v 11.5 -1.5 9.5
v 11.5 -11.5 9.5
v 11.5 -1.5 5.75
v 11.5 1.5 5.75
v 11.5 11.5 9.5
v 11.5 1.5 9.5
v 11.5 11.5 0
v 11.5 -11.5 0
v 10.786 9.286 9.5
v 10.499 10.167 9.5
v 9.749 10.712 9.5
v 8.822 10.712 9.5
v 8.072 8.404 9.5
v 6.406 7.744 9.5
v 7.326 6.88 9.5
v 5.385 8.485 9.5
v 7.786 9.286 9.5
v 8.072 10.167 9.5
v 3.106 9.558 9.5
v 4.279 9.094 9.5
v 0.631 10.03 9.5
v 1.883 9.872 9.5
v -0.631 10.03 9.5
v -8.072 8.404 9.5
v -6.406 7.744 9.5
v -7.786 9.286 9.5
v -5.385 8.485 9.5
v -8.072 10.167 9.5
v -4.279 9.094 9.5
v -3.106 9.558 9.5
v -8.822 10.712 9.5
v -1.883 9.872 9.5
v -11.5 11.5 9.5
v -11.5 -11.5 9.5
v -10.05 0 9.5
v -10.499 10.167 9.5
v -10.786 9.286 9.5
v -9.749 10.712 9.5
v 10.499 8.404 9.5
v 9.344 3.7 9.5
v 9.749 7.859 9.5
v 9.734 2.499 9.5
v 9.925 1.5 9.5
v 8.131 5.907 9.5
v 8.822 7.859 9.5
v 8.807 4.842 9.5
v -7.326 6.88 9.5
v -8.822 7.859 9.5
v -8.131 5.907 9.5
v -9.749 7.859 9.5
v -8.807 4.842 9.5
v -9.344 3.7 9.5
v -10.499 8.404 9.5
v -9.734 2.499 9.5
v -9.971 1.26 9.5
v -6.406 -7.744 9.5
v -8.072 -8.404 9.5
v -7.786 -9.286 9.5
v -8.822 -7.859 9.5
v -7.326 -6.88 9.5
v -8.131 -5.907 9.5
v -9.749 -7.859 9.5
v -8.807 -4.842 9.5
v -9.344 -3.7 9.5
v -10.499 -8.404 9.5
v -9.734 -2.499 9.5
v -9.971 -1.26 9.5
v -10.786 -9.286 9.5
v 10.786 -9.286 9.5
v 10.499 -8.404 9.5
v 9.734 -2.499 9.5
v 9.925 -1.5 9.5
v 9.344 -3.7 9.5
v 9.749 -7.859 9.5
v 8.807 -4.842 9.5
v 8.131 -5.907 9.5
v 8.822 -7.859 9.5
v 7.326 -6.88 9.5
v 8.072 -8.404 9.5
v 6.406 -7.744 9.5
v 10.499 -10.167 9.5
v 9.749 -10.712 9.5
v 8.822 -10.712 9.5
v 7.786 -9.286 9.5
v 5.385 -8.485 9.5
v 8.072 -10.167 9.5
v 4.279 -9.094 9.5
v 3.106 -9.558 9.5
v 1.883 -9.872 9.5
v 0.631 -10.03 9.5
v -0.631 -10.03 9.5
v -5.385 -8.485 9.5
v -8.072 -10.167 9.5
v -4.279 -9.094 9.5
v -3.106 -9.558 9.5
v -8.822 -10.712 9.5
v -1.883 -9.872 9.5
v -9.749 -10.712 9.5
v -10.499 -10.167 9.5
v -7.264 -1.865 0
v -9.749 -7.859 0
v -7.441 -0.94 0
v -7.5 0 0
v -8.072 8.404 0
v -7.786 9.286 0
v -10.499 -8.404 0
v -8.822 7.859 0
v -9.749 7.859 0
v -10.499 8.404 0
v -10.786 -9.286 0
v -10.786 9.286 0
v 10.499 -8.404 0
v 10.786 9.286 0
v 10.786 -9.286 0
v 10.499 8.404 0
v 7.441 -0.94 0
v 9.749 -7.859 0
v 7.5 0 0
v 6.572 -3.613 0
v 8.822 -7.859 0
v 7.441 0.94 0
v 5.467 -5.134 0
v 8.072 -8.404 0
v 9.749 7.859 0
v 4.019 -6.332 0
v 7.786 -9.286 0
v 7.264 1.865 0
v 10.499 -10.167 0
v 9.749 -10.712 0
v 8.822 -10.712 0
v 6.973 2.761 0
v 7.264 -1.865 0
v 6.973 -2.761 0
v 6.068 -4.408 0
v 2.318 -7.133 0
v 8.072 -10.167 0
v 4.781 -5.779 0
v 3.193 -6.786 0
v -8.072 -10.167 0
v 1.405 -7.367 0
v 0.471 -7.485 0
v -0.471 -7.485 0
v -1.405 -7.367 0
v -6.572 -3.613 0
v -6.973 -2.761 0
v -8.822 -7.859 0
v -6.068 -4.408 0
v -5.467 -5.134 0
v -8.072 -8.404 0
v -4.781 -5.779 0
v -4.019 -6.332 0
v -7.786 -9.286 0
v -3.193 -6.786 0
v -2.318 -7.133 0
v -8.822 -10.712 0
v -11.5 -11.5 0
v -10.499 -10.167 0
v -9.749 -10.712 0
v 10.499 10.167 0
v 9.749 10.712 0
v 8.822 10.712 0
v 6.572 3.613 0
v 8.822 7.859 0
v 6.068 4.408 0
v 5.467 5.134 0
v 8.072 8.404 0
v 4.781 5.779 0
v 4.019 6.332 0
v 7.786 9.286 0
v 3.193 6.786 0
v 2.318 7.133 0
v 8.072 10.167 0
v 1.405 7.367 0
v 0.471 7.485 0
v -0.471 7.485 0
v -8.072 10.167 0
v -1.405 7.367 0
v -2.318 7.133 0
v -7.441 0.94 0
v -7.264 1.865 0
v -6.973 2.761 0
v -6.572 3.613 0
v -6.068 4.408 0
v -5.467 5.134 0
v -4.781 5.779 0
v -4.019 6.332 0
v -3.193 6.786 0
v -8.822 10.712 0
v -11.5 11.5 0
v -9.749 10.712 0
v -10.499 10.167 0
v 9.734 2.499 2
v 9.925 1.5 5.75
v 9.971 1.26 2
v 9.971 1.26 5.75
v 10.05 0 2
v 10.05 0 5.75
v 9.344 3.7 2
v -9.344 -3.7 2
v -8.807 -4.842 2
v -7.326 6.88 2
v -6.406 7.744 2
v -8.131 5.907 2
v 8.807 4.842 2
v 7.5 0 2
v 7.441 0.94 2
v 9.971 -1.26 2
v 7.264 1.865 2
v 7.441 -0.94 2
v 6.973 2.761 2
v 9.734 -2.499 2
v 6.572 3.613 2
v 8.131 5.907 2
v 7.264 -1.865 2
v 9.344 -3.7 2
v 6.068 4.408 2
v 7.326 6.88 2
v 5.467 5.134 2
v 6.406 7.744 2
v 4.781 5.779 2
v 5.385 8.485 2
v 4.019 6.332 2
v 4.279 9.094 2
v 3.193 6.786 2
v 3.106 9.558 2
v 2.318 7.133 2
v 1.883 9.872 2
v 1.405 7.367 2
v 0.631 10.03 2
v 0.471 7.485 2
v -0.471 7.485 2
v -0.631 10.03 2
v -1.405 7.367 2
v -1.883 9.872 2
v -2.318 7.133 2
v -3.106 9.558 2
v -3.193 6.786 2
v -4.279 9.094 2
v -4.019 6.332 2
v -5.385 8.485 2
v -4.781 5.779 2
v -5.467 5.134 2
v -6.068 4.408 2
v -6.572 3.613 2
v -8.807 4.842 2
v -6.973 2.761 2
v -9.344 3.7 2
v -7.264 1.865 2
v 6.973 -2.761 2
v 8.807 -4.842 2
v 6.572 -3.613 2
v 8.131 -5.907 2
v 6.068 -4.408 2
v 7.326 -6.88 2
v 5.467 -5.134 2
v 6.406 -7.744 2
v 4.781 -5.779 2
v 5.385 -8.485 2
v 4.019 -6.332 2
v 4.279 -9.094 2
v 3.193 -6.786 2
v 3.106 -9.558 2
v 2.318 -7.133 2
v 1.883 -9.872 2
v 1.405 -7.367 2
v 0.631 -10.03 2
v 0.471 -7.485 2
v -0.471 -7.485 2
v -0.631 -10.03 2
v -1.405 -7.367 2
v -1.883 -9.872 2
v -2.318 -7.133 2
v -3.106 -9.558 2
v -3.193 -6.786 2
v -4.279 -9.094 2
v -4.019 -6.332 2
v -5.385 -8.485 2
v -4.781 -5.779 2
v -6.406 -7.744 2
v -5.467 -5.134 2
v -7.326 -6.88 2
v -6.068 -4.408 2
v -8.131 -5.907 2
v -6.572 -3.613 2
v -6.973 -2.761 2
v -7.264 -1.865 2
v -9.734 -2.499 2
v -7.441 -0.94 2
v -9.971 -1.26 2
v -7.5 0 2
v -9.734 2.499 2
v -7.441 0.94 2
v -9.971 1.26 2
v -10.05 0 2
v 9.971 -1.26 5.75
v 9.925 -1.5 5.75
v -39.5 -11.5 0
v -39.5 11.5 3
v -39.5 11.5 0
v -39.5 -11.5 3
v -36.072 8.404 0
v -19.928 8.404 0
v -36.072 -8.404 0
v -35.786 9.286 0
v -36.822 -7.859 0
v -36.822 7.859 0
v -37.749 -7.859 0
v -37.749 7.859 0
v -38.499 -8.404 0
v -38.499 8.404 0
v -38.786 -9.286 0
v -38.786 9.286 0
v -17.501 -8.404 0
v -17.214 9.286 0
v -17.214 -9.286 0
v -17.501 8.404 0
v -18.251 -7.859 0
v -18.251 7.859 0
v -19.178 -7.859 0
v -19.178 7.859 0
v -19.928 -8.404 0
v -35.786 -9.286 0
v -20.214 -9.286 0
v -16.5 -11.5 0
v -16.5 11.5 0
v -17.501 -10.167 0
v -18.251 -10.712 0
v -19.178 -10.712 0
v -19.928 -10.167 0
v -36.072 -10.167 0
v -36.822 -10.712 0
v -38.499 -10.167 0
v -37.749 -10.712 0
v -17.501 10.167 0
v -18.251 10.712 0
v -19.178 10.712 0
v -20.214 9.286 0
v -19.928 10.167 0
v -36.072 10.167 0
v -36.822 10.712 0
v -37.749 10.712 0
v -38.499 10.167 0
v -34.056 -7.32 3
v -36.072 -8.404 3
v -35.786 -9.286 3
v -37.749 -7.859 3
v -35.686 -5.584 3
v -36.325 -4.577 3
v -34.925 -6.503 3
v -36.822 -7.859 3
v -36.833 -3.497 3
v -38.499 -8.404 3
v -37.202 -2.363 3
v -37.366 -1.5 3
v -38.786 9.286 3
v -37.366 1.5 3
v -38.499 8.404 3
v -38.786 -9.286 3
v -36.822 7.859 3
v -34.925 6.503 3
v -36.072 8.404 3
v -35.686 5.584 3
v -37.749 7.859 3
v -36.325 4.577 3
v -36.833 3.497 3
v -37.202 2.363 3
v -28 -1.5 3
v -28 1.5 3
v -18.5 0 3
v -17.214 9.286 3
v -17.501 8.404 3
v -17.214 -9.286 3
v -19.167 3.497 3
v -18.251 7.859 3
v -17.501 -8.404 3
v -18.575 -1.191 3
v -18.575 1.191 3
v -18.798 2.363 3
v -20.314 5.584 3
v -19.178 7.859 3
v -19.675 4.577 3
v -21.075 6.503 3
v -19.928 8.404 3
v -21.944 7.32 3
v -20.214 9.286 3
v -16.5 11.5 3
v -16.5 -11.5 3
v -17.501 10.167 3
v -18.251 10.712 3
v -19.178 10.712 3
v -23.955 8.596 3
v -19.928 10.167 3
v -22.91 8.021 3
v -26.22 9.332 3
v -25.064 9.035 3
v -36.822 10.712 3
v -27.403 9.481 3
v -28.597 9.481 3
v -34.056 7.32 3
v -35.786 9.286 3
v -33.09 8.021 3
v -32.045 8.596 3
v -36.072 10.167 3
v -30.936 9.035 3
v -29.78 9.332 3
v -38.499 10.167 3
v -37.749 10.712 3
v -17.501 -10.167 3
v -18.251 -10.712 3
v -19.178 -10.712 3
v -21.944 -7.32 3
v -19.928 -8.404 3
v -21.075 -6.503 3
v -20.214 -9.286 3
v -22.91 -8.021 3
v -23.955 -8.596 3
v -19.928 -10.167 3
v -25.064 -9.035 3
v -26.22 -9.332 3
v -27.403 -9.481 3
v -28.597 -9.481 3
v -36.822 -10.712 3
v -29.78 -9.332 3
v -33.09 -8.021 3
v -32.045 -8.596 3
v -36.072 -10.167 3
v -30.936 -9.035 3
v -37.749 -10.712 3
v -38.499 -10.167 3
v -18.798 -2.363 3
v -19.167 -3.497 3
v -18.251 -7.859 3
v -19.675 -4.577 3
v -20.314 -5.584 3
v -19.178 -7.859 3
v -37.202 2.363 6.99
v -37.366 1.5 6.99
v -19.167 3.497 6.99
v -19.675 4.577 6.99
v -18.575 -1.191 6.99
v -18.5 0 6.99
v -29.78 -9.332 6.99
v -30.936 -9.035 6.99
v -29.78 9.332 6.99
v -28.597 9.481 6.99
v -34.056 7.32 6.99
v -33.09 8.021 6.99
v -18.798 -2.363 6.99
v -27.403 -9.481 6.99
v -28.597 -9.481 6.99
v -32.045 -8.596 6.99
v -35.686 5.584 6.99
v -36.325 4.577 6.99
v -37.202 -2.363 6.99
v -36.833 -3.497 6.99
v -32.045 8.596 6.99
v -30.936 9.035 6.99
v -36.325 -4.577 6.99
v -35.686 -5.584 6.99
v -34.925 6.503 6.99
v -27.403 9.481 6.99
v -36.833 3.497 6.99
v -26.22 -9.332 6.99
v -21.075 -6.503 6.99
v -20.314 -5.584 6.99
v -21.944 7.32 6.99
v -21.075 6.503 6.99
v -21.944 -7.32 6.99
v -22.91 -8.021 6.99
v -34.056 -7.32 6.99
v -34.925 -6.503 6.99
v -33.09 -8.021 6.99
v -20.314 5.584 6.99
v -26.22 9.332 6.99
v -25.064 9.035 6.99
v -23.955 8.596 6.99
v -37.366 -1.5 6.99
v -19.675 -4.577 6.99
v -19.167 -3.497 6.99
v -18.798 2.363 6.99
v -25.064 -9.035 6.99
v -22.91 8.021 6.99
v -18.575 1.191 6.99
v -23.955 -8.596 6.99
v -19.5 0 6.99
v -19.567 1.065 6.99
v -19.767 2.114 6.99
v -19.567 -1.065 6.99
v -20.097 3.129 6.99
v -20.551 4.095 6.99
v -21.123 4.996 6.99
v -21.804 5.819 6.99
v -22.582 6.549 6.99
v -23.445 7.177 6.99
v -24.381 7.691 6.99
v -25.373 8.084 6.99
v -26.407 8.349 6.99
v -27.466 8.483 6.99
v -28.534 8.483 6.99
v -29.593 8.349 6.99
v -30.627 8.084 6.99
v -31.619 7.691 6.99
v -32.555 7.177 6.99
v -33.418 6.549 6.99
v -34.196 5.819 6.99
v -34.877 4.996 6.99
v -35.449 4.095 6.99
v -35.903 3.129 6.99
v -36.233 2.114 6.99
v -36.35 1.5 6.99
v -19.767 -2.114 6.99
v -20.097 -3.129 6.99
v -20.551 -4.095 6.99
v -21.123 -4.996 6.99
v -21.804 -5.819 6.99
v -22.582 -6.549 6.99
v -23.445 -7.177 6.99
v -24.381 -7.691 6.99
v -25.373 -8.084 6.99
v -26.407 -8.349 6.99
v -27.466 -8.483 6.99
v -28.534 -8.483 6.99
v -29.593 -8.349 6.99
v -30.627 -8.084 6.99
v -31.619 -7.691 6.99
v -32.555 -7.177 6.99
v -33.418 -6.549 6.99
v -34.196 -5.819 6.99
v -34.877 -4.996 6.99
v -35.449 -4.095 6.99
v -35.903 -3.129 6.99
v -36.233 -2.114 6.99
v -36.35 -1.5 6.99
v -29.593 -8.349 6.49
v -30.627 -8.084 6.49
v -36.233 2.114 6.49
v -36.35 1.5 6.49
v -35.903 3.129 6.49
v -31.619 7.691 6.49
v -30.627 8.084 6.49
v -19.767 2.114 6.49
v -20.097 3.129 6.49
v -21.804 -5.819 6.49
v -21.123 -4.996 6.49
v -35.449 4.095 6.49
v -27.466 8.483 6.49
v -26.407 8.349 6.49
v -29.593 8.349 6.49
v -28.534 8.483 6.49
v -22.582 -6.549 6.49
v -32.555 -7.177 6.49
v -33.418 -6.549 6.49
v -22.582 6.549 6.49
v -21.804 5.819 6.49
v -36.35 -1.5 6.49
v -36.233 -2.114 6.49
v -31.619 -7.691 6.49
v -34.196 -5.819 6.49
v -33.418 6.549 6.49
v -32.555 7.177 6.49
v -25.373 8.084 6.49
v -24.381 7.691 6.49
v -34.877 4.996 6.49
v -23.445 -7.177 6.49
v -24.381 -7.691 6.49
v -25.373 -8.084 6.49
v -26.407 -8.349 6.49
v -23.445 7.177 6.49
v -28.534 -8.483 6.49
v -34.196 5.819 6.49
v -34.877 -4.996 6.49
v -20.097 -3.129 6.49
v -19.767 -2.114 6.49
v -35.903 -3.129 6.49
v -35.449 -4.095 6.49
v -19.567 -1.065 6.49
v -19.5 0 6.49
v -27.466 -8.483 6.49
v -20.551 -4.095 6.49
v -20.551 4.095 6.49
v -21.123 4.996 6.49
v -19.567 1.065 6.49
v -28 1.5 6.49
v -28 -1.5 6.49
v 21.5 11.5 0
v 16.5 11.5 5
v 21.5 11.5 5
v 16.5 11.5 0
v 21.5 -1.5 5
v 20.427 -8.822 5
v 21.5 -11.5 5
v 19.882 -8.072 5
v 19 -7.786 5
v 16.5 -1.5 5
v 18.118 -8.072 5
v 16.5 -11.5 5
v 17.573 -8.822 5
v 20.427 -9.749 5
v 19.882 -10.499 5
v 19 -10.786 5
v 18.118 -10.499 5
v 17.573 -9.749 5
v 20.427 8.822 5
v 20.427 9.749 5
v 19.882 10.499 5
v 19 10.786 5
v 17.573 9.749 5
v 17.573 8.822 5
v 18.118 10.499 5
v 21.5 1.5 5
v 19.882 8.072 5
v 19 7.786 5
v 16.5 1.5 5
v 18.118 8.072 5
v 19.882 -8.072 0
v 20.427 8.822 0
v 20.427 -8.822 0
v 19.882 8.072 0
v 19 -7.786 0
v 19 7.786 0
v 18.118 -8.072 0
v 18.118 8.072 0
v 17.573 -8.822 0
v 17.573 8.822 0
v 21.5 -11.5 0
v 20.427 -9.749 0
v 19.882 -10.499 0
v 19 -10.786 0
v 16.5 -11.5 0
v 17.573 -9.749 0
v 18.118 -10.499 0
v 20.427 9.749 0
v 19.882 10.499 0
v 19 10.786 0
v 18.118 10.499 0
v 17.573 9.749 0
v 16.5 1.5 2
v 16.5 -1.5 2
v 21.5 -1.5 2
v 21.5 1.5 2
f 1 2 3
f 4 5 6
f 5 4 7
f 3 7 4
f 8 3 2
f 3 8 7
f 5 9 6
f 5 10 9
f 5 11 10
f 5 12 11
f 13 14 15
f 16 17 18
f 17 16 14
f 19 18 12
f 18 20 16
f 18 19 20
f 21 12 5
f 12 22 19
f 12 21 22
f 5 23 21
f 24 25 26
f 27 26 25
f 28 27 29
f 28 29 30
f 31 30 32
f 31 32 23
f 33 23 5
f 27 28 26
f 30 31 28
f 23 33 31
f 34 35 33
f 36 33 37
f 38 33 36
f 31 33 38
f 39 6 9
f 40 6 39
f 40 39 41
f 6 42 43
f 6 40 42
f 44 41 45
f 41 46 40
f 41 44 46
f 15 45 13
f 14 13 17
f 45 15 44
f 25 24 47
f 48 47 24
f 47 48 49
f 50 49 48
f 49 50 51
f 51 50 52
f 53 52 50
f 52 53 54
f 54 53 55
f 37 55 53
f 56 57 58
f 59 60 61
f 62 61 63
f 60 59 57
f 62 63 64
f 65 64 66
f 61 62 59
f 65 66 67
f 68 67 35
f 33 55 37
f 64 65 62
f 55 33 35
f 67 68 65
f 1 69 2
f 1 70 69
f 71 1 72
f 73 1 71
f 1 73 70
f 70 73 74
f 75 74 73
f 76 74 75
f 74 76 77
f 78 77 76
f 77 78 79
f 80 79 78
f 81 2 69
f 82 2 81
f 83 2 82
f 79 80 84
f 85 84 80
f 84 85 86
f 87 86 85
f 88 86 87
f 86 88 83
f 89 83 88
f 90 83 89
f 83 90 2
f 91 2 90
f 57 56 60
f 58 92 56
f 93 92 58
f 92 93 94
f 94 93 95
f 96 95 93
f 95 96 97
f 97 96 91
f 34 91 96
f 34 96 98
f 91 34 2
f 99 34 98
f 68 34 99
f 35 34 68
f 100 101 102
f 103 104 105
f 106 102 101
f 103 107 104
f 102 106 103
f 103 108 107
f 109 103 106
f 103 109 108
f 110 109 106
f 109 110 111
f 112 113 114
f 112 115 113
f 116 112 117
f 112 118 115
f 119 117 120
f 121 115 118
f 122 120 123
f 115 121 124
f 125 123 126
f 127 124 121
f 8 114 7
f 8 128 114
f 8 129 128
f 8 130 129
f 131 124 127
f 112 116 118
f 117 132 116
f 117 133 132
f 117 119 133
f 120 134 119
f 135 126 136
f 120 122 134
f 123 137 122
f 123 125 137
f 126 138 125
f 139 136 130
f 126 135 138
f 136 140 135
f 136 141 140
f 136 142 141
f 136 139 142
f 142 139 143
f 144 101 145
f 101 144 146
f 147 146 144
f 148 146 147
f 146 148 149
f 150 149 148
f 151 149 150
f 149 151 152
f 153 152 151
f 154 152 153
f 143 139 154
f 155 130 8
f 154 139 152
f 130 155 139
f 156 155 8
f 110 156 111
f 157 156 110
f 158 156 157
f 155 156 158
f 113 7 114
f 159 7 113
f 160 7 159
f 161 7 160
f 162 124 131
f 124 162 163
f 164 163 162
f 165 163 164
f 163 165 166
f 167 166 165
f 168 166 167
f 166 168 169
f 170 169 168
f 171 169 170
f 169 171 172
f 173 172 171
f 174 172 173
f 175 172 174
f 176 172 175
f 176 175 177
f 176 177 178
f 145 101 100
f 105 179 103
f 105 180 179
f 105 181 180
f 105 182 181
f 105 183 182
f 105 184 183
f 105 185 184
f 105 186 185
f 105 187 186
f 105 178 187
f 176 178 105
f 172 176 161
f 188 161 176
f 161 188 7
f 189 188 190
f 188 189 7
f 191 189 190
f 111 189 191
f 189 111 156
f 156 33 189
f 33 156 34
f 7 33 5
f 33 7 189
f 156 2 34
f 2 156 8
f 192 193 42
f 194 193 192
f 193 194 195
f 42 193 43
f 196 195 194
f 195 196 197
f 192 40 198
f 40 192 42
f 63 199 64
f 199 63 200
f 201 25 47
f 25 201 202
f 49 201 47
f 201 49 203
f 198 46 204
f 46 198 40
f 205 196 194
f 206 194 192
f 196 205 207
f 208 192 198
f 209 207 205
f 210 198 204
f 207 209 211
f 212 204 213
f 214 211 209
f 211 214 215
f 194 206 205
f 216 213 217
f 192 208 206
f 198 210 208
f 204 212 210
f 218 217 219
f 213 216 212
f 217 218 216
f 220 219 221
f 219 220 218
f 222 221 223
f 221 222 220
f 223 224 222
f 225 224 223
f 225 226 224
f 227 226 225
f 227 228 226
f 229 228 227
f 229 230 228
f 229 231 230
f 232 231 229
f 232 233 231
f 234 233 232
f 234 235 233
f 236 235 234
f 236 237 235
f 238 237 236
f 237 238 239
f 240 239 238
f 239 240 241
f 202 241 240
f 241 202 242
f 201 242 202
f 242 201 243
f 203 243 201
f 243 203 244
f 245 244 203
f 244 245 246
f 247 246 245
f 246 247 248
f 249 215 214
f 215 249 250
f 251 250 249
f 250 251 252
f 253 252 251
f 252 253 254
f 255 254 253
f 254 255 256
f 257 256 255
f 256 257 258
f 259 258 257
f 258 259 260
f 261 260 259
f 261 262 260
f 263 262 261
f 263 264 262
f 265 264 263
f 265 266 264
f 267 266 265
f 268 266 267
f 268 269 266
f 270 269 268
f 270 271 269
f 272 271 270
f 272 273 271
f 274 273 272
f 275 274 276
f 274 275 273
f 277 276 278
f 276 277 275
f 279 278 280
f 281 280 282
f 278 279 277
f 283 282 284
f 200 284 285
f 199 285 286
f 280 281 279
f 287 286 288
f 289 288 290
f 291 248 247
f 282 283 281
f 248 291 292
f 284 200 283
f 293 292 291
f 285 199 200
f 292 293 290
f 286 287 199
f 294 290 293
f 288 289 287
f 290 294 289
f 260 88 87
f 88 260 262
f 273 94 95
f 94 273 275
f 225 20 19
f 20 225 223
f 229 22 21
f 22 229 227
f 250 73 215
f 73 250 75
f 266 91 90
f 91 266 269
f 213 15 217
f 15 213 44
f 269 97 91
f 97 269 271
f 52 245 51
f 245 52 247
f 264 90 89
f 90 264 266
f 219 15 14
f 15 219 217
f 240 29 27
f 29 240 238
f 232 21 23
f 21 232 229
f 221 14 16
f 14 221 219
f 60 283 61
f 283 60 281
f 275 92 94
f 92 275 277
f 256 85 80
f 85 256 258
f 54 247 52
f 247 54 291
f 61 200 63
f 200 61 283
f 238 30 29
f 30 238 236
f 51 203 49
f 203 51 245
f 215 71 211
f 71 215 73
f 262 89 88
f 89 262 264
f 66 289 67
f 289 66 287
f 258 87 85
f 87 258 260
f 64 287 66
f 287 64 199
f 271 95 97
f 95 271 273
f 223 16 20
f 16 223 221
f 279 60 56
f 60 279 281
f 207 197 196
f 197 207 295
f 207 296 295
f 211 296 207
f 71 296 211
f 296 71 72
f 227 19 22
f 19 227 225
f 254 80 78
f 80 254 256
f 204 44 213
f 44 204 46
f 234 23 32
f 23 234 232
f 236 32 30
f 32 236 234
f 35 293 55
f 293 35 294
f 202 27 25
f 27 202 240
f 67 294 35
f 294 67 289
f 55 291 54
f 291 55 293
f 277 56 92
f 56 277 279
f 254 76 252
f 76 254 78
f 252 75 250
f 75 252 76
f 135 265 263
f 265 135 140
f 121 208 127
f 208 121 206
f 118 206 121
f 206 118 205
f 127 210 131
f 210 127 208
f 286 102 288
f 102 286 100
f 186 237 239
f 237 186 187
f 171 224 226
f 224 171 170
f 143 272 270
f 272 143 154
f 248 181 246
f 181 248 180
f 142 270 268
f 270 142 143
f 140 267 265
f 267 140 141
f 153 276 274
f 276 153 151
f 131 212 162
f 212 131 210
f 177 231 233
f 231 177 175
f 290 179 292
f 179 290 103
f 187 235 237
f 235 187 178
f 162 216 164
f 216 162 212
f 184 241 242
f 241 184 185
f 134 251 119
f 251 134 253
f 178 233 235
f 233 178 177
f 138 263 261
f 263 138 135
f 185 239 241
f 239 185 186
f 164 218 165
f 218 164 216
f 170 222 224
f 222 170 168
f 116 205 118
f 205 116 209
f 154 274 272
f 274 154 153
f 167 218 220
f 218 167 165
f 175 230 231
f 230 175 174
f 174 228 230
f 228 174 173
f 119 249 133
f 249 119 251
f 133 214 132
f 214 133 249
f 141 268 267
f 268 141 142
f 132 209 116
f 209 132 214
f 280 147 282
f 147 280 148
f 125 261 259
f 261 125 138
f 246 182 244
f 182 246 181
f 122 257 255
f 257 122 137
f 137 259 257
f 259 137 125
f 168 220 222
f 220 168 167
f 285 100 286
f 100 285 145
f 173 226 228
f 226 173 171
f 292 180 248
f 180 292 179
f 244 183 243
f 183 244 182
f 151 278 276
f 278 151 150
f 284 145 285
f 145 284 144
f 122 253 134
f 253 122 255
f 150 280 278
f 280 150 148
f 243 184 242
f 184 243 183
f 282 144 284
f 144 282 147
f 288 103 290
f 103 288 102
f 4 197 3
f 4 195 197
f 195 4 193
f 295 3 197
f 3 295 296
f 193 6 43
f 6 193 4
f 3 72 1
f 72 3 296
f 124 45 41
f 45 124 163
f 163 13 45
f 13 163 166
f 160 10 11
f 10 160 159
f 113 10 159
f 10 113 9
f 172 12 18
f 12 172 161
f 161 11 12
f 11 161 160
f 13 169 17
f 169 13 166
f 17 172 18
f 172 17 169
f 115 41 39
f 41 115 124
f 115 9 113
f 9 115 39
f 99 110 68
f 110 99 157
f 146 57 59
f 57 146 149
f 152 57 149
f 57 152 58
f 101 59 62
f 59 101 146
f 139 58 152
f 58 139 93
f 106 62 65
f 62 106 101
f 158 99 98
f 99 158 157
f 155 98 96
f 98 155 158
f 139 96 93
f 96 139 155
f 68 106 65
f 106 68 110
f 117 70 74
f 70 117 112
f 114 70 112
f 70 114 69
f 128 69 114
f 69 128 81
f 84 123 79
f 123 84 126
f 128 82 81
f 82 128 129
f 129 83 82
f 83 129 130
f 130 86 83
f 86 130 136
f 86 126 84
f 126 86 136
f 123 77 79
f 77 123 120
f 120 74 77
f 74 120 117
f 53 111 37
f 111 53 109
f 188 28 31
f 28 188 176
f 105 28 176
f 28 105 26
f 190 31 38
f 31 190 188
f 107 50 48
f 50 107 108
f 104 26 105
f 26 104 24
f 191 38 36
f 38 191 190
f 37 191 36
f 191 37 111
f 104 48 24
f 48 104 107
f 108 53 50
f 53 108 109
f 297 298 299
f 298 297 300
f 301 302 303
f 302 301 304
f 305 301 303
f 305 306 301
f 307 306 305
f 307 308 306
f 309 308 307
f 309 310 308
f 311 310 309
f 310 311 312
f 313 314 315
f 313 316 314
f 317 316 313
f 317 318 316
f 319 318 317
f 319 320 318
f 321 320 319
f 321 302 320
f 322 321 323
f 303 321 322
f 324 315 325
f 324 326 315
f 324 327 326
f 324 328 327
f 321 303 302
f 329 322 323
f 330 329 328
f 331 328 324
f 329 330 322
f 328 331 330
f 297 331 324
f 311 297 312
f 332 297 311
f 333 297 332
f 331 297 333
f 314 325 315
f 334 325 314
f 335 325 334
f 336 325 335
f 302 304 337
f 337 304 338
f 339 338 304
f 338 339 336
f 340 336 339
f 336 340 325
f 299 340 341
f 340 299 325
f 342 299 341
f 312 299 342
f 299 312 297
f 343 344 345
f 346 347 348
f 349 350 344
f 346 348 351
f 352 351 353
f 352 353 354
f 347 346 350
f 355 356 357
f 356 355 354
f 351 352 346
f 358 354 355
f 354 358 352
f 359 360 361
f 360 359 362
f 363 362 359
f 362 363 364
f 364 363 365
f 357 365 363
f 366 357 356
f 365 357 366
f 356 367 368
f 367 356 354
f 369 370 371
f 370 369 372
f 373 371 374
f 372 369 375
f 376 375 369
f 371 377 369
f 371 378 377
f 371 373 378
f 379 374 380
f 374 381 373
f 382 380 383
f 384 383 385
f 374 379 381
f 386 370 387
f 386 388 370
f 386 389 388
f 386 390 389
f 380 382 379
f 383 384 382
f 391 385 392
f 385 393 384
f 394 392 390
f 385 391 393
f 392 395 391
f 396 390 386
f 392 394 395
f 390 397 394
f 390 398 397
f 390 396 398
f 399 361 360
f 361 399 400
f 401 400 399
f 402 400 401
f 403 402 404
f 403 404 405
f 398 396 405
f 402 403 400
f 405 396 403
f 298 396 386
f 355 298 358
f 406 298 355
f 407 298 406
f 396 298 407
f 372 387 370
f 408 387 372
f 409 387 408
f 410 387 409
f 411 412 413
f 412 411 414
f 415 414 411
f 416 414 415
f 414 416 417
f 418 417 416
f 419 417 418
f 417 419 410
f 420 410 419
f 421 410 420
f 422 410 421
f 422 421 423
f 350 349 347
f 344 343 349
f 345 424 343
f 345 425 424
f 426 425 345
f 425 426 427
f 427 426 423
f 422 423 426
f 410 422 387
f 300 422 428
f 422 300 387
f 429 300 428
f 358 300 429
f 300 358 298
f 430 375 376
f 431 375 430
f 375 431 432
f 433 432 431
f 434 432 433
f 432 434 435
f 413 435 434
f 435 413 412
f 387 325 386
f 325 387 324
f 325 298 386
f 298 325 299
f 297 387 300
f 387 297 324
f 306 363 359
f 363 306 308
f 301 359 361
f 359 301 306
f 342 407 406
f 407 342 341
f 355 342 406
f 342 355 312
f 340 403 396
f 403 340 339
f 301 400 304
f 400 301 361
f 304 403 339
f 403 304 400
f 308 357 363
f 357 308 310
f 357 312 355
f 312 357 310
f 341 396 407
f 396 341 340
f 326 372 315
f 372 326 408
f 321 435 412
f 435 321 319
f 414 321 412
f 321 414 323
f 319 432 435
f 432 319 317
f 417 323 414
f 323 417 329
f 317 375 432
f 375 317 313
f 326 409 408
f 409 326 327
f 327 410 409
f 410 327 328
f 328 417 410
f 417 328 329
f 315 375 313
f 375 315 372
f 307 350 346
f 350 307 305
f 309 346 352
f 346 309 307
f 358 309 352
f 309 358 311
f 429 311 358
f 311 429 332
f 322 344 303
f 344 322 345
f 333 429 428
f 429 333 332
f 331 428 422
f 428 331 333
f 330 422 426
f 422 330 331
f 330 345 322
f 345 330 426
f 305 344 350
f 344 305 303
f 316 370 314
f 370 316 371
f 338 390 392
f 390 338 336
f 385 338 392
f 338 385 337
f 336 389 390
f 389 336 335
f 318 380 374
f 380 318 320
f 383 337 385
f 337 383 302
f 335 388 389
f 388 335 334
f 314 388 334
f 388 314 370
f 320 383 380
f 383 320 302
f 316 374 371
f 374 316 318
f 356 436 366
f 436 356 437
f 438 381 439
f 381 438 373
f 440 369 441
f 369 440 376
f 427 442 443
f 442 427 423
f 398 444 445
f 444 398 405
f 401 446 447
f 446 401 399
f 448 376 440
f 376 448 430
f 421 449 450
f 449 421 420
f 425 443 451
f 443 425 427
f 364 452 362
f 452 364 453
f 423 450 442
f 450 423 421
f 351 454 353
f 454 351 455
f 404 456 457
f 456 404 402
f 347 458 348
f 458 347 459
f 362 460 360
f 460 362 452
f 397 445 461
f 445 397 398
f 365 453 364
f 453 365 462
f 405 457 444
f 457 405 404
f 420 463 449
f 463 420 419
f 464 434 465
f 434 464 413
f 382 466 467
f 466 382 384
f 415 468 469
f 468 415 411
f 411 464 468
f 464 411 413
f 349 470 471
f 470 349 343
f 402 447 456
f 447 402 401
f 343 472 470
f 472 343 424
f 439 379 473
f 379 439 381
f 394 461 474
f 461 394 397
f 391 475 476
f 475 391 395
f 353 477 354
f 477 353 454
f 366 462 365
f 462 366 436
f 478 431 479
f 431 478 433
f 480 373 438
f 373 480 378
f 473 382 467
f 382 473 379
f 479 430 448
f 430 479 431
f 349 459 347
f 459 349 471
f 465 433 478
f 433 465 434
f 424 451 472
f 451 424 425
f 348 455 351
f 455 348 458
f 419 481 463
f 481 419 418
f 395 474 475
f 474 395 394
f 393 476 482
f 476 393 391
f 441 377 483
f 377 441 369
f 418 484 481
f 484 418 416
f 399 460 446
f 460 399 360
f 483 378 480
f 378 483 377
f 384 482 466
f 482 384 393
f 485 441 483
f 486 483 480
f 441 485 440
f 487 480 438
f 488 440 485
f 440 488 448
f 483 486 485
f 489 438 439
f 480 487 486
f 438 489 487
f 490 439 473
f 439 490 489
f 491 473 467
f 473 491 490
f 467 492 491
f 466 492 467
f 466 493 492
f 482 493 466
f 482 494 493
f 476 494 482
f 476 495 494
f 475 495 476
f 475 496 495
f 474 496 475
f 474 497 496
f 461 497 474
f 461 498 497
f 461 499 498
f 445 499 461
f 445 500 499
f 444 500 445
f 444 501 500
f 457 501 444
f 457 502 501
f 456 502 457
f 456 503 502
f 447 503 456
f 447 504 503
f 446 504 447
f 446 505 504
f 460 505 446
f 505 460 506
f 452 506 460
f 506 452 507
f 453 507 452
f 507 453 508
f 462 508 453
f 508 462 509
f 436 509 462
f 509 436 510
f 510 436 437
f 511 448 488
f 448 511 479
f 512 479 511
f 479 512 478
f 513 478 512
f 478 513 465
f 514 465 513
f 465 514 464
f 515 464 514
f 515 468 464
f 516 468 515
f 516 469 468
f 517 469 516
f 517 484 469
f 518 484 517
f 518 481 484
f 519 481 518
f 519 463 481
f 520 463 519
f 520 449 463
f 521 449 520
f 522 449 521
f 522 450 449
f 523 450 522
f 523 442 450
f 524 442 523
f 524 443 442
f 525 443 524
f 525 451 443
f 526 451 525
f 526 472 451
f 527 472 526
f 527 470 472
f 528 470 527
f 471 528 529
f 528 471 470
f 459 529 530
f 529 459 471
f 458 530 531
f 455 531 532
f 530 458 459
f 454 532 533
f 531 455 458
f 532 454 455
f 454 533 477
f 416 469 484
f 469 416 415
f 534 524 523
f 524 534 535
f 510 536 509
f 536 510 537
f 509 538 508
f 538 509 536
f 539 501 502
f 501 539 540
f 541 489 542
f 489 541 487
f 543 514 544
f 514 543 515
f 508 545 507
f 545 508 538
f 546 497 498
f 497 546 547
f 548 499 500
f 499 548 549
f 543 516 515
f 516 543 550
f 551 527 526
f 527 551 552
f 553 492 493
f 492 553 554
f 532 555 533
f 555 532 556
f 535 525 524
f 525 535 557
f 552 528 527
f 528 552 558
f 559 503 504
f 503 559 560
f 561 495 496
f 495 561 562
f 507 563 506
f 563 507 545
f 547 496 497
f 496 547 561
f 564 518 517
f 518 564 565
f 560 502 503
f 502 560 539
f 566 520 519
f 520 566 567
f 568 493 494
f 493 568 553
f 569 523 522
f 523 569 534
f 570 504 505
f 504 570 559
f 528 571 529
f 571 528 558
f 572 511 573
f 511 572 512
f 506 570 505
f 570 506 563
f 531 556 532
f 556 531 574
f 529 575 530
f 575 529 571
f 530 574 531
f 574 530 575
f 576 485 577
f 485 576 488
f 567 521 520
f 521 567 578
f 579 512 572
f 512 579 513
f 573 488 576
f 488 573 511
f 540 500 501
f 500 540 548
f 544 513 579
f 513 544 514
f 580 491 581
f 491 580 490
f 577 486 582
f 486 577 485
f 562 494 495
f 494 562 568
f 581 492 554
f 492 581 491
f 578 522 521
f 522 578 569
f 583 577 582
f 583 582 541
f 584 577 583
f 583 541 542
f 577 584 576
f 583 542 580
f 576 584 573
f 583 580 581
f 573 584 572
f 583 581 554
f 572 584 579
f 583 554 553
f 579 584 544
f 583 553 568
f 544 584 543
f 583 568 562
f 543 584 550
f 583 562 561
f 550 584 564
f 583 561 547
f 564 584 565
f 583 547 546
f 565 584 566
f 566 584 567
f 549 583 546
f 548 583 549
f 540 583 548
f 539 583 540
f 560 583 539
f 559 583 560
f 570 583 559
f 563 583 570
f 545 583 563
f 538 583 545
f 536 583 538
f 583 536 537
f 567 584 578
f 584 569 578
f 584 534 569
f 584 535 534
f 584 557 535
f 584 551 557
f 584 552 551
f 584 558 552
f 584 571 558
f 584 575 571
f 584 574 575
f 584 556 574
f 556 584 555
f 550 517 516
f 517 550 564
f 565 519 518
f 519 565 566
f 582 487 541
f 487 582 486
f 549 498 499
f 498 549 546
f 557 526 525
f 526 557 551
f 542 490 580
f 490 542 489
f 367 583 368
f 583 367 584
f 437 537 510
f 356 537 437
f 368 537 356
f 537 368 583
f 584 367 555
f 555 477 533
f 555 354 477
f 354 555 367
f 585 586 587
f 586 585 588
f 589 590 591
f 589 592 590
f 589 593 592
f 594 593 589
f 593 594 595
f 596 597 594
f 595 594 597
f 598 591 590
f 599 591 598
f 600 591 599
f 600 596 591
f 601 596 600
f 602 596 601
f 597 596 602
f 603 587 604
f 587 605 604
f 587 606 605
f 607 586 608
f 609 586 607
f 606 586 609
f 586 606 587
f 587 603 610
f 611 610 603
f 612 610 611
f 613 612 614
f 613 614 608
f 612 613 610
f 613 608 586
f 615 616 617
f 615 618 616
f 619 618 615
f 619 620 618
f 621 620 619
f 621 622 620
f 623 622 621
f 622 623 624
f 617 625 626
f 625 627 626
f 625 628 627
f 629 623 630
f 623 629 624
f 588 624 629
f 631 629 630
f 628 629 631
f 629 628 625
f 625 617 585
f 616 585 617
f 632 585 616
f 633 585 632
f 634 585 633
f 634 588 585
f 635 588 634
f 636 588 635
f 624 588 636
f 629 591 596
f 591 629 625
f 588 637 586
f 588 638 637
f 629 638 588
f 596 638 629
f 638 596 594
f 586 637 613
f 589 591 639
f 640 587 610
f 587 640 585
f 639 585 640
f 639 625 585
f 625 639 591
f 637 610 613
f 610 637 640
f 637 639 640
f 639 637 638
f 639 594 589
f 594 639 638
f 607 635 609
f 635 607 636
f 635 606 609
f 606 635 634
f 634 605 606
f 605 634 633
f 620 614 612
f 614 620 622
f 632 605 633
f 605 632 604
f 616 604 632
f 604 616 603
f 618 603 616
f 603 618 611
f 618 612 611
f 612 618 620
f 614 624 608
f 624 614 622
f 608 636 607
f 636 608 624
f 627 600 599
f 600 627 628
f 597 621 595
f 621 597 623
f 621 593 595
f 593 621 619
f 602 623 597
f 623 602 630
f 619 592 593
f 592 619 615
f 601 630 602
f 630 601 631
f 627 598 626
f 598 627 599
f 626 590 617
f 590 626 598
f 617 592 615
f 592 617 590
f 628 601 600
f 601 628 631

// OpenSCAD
//
// This script is used to create the components for a printable inkjet head, and is based
// on the design by Adrian Bowyer (http://www.thingiverse.com/thing:5152). This script
// is parameterized so that different sized piezos and nozzle plates can be used.
//
// The main difference from the #5152 version is that only a single o-ring is used.
//
// License: GPL V2
// 
// Version 0.1, Dec 17th, 2010 - Created by madscifi - This has not yet been printed
// Modified by Adrian to allow for 2 or 1 O rings and to make the clamp plate thicker in the middle. 
// 

//
// If gen_for_stl is 0, the various components are positioned as an "exploded" stack,
// so it is easy to see how they interact. 
//
// If gen_for_stl is 1, the various components are positioned to be printed as a single
// plate, with the components distributed along the x axis.
//
// As originally submitted this script is configured to create all components for printing
// and is configured for a 20 mm diameter piezo and a 2 mm high o-ring.

gen_for_stl = 1;	   		// set to 1 if the enabled component should be positioned for printing

//
// The following variables control the various dimensions - all in mm
// These will likely need to be changed, depending on the specific piezo,
// o-ring and nozzle plate used.
//

piezo_diameter=20;		// diameter of piezo disk
piezo_height=0.5;		// height of piezo disk

o_ring_height=2;		// height of o-ring
number_of_o_rings=1;         // Set to 2 to sandwich the piezo between 2 O rings; 1 for just one underneath


nozzle_plate_height=2;

body_xy_extra=3; 		// extra space beyond the piezo that the body uses.
body_extra_height=3;

bolt_hole_diameter=3;	// diameter of bolt holes

tube_diameter = 3;		// diameter of tubing
tube_clamp_extra_height = 2;	// extra height ( over tube height) of tube clamp.
tube_clamp_extra_width = 2; // extra width (over bolt holes) of tube clamp

//
// The following variables might need to be tweaked, or they might be
// fine as is. It is probably best to do a test print before changing them.
//

nozzle_ledge_height=2;		// height of the ledge used to support the nozzle plate
nozzle_ledge_inset=5;		// inset of the ledge used to support the nozzle plate

piezo_clearance=0.1;			// allowance between the body and the piezo in the xy plane

piezo_clamp_clearance=0.1;	// allowance between the body and the piezo clamp ring
piezo_clamp_clearance=1;		// width of the piezo clamp pressure ring

piezo_clamp_square_height=3;	// height of piezo clamp support square

wire_cut_width=3;			// width of wire cutout

bolt_hole_resolution=10;		// number of "sides" to use when generating the bolt holes
large_hole_resolution=50;		// number of "sides" to use when generating the larger circular features

component_stl_spacing=5;		// space between components when generating stl

//
// The following should not need to be modified unless the basic design is being changed.
//

body_xy_size=piezo_diameter+body_xy_extra;

body_height=nozzle_ledge_height+nozzle_plate_height+o_ring_height+piezo_height+body_extra_height;

bolt_xy_pos=((piezo_diameter/2)*sin(45)+(body_xy_size/2))/2;

tube_clamp_height = tube_diameter + tube_clamp_extra_height;
tube_clamp_width = bolt_hole_diameter + tube_clamp_extra_width;

ring_subtract = (1 - number_of_o_rings)*o_ring_height;

//
// Body component
//

  translate(v = [0,0,gen_for_stl==0?0:body_height/2])
  {
    difference()
    {
      // starting body block
      cube(size=[body_xy_size,body_xy_size,body_height],center=true);
      
      // chamber cutout
      translate(v = [0, 0, nozzle_ledge_height])
      {
        cylinder(h = body_height, r=(piezo_diameter+piezo_clearance)/2, center = true, $fn=large_hole_resolution);
      }

      // nozzle cutout
      cylinder(h = body_height+1, r=(piezo_diameter-nozzle_ledge_inset)/2, center = true, $fn=large_hole_resolution);

      // cut out for piezo wires
      translate(v = [body_xy_size/2, 0, body_height/2-(body_extra_height+piezo_height+(o_ring_height/8))/2])
      {
        cube(size=[body_xy_size,wire_cut_width,body_extra_height+piezo_height+(o_ring_height/8)],center=true);
      }

      // bolt cutouts
      translate(v = [bolt_xy_pos, bolt_xy_pos, 0])
      {
        cylinder(h = body_height+1, r=(bolt_hole_diameter)/2, center = true, $fn=bolt_hole_resolution);
      }
      translate(v = [-bolt_xy_pos, -bolt_xy_pos, 0])
      {
        cylinder(h = body_height+1, r=(bolt_hole_diameter)/2, center = true, $fn=bolt_hole_resolution);
      }
      translate(v = [bolt_xy_pos, -bolt_xy_pos, 0])
      {
        cylinder(h = body_height+1, r=(bolt_hole_diameter)/2, center = true, $fn=bolt_hole_resolution);
      }
      translate(v = [-bolt_xy_pos, bolt_xy_pos, 0])
      {
        cylinder(h = body_height+1, r=(bolt_hole_diameter)/2, center = true, $fn=bolt_hole_resolution);
      }
    }
  }

//
// Piezo Clamp
//

  translate(v = [gen_for_stl==0?0:-(body_xy_size+component_stl_spacing),0, gen_for_stl==0?body_height+5:piezo_clamp_square_height/2])
  {
    rotate(a=[0, gen_for_stl==0?0:180,0])
    {
      union() {
        difference()
        {
          // starting square (structural support)
          cube(size=[body_xy_size,body_xy_size,piezo_clamp_square_height],center=true);

          // bolt cutouts
          translate(v = [bolt_xy_pos, bolt_xy_pos, 0])
          {
            cylinder(h = body_height+1, r=(bolt_hole_diameter)/2, center = true, $fn=bolt_hole_resolution);
          }
          translate(v = [-bolt_xy_pos, -bolt_xy_pos, 0])
          {
            cylinder(h = body_height+1, r=(bolt_hole_diameter)/2, center = true, $fn=bolt_hole_resolution);
          }
          translate(v = [bolt_xy_pos, -bolt_xy_pos, 0])
          {
            cylinder(h = body_height+1, r=(bolt_hole_diameter)/2, center = true, $fn=bolt_hole_resolution);
          }
          translate(v = [-bolt_xy_pos, bolt_xy_pos, 0])
          {
            cylinder(h = body_height+1, r=(bolt_hole_diameter)/2, center = true, $fn=bolt_hole_resolution);
          }
        }

        // pressure ring

        translate(v = [0,0, -(body_extra_height+(o_ring_height/2))/2-piezo_clamp_square_height/2+0.01])
        {
          difference()
          {
            // starting ring material
            translate(v = [0,0,  -0.5*ring_subtract])
            cylinder(
	      h = body_extra_height+(o_ring_height/2) + ring_subtract,
	      r=(piezo_diameter-piezo_clamp_clearance)/2,
	      center = true,
	      $fn=large_hole_resolution);
	      
            // hollow out ring
	  translate(v = [0,0,-ring_subtract-2*o_ring_height])
            cylinder(
	      h = body_extra_height+(o_ring_height/2)+1,
	      r=(piezo_diameter-piezo_clamp_clearance)/2-piezo_clamp_clearance,
	      center = true,
	      $fn=large_hole_resolution);

            // cut out for piezo wire
            translate(v = [body_xy_size/2, 0, 0])
            {
              cube(size=[body_xy_size,wire_cut_width,body_extra_height+(o_ring_height/2)],center=true);
            }
          }
        }
      }
    }
  }

//
// Tube Clamp
//

  translate(
    v = [
      gen_for_stl==0?0:body_xy_size/2+tube_clamp_width/2+component_stl_spacing,
      gen_for_stl==0?(body_xy_size-tube_clamp_width)/2:0,
      gen_for_stl==0?-(body_height+tube_clamp_height)/2-5:tube_clamp_height/2])
  {
    rotate(a=[0, 0, gen_for_stl==0?0:90])
    {
    difference()
    {
      // starting tube clamp body
      cube(size=[body_xy_size,tube_clamp_width,tube_clamp_height],center=true);

      // tube cutout
      translate(v = [0,0,(tube_clamp_height-tube_diameter)/2])
      {
        cube(size=[tube_diameter,tube_clamp_width+2,tube_diameter],center=true);
      }

      // bolt hole cutouts
      translate(v = [bolt_xy_pos,0, 0])
      {
        cylinder(h = body_height+1, r=(bolt_hole_diameter)/2, center = true, $fn=bolt_hole_resolution);
      }
      translate(v = [-bolt_xy_pos,0, 0])
      {
        cylinder(h = body_height+1, r=(bolt_hole_diameter)/2, center = true, $fn=bolt_hole_resolution);
      }
    }
  }
}
